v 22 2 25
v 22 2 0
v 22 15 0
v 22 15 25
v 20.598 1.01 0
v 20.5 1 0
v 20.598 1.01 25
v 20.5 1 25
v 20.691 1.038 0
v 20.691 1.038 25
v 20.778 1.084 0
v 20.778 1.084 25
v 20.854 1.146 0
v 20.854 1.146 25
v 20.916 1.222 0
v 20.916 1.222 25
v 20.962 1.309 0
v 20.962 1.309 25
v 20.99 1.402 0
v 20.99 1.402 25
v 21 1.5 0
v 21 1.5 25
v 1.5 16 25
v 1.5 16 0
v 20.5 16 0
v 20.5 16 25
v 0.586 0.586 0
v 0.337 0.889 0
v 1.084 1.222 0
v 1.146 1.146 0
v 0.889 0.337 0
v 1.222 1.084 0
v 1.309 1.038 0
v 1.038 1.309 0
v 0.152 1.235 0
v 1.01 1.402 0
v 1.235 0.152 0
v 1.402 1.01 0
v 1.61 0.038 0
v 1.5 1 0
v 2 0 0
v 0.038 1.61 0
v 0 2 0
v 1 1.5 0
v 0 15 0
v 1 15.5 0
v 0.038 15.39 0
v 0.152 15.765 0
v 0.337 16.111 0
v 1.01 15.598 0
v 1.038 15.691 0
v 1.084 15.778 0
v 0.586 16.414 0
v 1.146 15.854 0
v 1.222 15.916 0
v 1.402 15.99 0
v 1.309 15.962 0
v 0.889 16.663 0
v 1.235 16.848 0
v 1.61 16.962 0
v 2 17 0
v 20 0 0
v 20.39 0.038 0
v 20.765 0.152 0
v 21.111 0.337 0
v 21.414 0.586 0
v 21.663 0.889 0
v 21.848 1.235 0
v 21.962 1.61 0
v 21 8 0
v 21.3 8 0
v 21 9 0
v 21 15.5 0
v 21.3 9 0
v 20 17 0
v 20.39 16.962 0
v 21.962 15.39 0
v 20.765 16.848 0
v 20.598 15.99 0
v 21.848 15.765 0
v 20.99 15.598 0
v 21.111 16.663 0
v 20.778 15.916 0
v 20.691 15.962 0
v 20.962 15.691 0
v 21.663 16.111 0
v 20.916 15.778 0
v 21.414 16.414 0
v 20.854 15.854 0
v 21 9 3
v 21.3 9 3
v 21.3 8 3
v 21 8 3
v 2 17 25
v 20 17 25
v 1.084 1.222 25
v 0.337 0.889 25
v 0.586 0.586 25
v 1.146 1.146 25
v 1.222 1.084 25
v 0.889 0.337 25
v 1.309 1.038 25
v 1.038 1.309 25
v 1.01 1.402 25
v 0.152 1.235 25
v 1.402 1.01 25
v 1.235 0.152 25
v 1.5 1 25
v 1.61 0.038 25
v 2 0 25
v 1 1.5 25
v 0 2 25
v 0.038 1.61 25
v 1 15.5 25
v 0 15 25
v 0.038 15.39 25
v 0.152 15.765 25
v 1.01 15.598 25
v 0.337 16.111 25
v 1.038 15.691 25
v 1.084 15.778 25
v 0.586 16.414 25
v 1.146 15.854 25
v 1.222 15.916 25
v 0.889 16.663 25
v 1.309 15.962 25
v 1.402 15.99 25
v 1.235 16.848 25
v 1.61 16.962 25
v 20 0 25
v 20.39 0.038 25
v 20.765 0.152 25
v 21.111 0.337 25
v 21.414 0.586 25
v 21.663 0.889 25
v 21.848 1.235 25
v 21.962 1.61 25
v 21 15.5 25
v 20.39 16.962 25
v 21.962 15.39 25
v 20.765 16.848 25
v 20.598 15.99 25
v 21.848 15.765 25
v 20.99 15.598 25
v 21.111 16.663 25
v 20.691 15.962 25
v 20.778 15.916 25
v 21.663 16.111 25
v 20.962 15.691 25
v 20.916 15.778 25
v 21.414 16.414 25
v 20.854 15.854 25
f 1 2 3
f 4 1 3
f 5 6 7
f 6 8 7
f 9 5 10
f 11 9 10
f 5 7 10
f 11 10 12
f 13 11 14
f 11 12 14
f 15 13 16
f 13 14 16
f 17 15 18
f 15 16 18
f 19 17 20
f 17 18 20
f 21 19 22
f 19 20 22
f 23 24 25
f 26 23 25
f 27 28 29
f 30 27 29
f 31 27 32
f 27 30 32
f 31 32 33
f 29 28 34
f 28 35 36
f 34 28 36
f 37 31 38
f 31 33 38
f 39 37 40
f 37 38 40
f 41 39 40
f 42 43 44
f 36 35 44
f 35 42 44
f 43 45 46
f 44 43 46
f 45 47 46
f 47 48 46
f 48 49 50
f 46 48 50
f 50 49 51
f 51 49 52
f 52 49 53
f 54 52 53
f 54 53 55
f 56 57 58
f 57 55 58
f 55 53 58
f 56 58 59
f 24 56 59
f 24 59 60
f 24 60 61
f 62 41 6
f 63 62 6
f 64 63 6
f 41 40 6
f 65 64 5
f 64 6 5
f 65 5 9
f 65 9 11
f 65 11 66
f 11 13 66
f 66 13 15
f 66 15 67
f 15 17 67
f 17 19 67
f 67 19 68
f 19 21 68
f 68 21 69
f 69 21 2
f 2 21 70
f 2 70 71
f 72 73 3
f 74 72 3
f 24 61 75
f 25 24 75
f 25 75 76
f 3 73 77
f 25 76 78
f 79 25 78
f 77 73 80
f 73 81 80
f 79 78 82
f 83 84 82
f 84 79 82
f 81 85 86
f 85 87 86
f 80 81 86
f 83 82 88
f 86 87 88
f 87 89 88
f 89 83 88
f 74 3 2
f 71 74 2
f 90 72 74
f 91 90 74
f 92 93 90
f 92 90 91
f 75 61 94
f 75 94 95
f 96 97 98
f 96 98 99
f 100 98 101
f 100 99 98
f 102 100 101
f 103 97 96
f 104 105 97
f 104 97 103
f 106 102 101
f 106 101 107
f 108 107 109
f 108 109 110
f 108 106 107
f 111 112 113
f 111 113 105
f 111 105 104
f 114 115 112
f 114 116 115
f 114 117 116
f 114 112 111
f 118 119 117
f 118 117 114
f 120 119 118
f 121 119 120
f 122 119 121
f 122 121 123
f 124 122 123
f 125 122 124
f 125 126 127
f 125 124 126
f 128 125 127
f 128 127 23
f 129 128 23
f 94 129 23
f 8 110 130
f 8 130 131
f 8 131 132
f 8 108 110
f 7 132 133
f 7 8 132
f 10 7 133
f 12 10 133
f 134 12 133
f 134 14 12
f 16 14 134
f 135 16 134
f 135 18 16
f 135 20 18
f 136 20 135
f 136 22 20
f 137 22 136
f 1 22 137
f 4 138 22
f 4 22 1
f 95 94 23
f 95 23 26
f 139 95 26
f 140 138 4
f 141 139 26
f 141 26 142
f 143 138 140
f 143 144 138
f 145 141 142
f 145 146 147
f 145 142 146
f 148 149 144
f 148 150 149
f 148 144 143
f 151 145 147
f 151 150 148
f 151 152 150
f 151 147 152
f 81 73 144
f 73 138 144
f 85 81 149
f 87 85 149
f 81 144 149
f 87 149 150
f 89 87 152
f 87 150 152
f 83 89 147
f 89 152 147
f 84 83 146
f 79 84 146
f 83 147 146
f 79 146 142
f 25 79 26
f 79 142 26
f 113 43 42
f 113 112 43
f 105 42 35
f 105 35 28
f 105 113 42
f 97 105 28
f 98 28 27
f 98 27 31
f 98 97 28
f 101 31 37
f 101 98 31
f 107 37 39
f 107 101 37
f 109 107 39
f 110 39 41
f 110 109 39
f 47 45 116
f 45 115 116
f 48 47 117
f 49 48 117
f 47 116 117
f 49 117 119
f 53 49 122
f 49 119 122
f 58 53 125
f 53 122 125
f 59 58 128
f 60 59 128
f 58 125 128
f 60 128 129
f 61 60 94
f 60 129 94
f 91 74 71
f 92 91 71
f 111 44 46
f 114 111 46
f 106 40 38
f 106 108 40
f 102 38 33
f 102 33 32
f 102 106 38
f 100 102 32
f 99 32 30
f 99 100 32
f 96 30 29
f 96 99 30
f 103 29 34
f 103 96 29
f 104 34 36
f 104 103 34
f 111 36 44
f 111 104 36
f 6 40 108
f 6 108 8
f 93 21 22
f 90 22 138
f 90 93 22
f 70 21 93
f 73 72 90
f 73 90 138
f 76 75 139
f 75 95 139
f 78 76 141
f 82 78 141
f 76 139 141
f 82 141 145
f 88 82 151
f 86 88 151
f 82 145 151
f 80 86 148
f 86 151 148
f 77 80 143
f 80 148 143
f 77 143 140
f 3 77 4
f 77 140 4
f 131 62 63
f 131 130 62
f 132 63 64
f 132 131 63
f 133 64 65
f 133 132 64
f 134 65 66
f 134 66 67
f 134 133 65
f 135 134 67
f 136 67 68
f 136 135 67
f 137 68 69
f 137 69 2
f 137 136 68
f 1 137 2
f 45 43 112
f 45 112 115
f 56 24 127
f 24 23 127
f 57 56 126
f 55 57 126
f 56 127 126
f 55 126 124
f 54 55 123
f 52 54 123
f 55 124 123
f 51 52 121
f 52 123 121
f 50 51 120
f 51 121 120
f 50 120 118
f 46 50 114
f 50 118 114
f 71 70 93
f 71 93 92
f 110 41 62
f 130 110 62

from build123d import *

# Parameters (mm, degrees)
F0_W     = 22
F0_H     = 17
F0_W_2   = 20
F0_H_2   = 15
F1_DEPTH = 25
F2_R     = 2
F3_W     = 0.3
F3_H     = 1
F4_DEPTH = 3
F5_R     = 0.5


with BuildPart() as f1:
    # F0 (on Top) → F1 (new body)
    with BuildSketch(Plane.XY):
        with Locations((11, 8.5)):
            Rectangle(F0_W, F0_H)
        with Locations((11, 8.5)):
            Rectangle(F0_W_2, F0_H_2, mode=Mode.SUBTRACT)
    extrude(amount=F1_DEPTH)

    # F2
    f2_edges = [f1.edges().sort_by_distance(p)[0] for p in [
        (0, 17, 12.5),
        (0, 0, 12.5),
        (22, 0, 12.5),
        (22, 17, 12.5),
    ]]
    fillet(f2_edges, radius=F2_R)

    # F3 (on face) → F4 (cut)
    with BuildSketch(Plane(origin=(0, 0, 0), x_dir=(1, 0, 0), z_dir=(0, 0, -1))):
        with Locations((21.15, -8.5)):
            Rectangle(F3_W, F3_H)
    extrude(amount=-F4_DEPTH, mode=Mode.SUBTRACT)

    # F5
    f5_edges = [f1.edges().sort_by_distance(p)[0] for p in [
        (21, 1, 12.5),
        (1, 1, 12.5),
        (1, 16, 12.5),
        (21, 16, 12.5),
    ]]
    fillet(f5_edges, radius=F5_R)


solid = f1.part
